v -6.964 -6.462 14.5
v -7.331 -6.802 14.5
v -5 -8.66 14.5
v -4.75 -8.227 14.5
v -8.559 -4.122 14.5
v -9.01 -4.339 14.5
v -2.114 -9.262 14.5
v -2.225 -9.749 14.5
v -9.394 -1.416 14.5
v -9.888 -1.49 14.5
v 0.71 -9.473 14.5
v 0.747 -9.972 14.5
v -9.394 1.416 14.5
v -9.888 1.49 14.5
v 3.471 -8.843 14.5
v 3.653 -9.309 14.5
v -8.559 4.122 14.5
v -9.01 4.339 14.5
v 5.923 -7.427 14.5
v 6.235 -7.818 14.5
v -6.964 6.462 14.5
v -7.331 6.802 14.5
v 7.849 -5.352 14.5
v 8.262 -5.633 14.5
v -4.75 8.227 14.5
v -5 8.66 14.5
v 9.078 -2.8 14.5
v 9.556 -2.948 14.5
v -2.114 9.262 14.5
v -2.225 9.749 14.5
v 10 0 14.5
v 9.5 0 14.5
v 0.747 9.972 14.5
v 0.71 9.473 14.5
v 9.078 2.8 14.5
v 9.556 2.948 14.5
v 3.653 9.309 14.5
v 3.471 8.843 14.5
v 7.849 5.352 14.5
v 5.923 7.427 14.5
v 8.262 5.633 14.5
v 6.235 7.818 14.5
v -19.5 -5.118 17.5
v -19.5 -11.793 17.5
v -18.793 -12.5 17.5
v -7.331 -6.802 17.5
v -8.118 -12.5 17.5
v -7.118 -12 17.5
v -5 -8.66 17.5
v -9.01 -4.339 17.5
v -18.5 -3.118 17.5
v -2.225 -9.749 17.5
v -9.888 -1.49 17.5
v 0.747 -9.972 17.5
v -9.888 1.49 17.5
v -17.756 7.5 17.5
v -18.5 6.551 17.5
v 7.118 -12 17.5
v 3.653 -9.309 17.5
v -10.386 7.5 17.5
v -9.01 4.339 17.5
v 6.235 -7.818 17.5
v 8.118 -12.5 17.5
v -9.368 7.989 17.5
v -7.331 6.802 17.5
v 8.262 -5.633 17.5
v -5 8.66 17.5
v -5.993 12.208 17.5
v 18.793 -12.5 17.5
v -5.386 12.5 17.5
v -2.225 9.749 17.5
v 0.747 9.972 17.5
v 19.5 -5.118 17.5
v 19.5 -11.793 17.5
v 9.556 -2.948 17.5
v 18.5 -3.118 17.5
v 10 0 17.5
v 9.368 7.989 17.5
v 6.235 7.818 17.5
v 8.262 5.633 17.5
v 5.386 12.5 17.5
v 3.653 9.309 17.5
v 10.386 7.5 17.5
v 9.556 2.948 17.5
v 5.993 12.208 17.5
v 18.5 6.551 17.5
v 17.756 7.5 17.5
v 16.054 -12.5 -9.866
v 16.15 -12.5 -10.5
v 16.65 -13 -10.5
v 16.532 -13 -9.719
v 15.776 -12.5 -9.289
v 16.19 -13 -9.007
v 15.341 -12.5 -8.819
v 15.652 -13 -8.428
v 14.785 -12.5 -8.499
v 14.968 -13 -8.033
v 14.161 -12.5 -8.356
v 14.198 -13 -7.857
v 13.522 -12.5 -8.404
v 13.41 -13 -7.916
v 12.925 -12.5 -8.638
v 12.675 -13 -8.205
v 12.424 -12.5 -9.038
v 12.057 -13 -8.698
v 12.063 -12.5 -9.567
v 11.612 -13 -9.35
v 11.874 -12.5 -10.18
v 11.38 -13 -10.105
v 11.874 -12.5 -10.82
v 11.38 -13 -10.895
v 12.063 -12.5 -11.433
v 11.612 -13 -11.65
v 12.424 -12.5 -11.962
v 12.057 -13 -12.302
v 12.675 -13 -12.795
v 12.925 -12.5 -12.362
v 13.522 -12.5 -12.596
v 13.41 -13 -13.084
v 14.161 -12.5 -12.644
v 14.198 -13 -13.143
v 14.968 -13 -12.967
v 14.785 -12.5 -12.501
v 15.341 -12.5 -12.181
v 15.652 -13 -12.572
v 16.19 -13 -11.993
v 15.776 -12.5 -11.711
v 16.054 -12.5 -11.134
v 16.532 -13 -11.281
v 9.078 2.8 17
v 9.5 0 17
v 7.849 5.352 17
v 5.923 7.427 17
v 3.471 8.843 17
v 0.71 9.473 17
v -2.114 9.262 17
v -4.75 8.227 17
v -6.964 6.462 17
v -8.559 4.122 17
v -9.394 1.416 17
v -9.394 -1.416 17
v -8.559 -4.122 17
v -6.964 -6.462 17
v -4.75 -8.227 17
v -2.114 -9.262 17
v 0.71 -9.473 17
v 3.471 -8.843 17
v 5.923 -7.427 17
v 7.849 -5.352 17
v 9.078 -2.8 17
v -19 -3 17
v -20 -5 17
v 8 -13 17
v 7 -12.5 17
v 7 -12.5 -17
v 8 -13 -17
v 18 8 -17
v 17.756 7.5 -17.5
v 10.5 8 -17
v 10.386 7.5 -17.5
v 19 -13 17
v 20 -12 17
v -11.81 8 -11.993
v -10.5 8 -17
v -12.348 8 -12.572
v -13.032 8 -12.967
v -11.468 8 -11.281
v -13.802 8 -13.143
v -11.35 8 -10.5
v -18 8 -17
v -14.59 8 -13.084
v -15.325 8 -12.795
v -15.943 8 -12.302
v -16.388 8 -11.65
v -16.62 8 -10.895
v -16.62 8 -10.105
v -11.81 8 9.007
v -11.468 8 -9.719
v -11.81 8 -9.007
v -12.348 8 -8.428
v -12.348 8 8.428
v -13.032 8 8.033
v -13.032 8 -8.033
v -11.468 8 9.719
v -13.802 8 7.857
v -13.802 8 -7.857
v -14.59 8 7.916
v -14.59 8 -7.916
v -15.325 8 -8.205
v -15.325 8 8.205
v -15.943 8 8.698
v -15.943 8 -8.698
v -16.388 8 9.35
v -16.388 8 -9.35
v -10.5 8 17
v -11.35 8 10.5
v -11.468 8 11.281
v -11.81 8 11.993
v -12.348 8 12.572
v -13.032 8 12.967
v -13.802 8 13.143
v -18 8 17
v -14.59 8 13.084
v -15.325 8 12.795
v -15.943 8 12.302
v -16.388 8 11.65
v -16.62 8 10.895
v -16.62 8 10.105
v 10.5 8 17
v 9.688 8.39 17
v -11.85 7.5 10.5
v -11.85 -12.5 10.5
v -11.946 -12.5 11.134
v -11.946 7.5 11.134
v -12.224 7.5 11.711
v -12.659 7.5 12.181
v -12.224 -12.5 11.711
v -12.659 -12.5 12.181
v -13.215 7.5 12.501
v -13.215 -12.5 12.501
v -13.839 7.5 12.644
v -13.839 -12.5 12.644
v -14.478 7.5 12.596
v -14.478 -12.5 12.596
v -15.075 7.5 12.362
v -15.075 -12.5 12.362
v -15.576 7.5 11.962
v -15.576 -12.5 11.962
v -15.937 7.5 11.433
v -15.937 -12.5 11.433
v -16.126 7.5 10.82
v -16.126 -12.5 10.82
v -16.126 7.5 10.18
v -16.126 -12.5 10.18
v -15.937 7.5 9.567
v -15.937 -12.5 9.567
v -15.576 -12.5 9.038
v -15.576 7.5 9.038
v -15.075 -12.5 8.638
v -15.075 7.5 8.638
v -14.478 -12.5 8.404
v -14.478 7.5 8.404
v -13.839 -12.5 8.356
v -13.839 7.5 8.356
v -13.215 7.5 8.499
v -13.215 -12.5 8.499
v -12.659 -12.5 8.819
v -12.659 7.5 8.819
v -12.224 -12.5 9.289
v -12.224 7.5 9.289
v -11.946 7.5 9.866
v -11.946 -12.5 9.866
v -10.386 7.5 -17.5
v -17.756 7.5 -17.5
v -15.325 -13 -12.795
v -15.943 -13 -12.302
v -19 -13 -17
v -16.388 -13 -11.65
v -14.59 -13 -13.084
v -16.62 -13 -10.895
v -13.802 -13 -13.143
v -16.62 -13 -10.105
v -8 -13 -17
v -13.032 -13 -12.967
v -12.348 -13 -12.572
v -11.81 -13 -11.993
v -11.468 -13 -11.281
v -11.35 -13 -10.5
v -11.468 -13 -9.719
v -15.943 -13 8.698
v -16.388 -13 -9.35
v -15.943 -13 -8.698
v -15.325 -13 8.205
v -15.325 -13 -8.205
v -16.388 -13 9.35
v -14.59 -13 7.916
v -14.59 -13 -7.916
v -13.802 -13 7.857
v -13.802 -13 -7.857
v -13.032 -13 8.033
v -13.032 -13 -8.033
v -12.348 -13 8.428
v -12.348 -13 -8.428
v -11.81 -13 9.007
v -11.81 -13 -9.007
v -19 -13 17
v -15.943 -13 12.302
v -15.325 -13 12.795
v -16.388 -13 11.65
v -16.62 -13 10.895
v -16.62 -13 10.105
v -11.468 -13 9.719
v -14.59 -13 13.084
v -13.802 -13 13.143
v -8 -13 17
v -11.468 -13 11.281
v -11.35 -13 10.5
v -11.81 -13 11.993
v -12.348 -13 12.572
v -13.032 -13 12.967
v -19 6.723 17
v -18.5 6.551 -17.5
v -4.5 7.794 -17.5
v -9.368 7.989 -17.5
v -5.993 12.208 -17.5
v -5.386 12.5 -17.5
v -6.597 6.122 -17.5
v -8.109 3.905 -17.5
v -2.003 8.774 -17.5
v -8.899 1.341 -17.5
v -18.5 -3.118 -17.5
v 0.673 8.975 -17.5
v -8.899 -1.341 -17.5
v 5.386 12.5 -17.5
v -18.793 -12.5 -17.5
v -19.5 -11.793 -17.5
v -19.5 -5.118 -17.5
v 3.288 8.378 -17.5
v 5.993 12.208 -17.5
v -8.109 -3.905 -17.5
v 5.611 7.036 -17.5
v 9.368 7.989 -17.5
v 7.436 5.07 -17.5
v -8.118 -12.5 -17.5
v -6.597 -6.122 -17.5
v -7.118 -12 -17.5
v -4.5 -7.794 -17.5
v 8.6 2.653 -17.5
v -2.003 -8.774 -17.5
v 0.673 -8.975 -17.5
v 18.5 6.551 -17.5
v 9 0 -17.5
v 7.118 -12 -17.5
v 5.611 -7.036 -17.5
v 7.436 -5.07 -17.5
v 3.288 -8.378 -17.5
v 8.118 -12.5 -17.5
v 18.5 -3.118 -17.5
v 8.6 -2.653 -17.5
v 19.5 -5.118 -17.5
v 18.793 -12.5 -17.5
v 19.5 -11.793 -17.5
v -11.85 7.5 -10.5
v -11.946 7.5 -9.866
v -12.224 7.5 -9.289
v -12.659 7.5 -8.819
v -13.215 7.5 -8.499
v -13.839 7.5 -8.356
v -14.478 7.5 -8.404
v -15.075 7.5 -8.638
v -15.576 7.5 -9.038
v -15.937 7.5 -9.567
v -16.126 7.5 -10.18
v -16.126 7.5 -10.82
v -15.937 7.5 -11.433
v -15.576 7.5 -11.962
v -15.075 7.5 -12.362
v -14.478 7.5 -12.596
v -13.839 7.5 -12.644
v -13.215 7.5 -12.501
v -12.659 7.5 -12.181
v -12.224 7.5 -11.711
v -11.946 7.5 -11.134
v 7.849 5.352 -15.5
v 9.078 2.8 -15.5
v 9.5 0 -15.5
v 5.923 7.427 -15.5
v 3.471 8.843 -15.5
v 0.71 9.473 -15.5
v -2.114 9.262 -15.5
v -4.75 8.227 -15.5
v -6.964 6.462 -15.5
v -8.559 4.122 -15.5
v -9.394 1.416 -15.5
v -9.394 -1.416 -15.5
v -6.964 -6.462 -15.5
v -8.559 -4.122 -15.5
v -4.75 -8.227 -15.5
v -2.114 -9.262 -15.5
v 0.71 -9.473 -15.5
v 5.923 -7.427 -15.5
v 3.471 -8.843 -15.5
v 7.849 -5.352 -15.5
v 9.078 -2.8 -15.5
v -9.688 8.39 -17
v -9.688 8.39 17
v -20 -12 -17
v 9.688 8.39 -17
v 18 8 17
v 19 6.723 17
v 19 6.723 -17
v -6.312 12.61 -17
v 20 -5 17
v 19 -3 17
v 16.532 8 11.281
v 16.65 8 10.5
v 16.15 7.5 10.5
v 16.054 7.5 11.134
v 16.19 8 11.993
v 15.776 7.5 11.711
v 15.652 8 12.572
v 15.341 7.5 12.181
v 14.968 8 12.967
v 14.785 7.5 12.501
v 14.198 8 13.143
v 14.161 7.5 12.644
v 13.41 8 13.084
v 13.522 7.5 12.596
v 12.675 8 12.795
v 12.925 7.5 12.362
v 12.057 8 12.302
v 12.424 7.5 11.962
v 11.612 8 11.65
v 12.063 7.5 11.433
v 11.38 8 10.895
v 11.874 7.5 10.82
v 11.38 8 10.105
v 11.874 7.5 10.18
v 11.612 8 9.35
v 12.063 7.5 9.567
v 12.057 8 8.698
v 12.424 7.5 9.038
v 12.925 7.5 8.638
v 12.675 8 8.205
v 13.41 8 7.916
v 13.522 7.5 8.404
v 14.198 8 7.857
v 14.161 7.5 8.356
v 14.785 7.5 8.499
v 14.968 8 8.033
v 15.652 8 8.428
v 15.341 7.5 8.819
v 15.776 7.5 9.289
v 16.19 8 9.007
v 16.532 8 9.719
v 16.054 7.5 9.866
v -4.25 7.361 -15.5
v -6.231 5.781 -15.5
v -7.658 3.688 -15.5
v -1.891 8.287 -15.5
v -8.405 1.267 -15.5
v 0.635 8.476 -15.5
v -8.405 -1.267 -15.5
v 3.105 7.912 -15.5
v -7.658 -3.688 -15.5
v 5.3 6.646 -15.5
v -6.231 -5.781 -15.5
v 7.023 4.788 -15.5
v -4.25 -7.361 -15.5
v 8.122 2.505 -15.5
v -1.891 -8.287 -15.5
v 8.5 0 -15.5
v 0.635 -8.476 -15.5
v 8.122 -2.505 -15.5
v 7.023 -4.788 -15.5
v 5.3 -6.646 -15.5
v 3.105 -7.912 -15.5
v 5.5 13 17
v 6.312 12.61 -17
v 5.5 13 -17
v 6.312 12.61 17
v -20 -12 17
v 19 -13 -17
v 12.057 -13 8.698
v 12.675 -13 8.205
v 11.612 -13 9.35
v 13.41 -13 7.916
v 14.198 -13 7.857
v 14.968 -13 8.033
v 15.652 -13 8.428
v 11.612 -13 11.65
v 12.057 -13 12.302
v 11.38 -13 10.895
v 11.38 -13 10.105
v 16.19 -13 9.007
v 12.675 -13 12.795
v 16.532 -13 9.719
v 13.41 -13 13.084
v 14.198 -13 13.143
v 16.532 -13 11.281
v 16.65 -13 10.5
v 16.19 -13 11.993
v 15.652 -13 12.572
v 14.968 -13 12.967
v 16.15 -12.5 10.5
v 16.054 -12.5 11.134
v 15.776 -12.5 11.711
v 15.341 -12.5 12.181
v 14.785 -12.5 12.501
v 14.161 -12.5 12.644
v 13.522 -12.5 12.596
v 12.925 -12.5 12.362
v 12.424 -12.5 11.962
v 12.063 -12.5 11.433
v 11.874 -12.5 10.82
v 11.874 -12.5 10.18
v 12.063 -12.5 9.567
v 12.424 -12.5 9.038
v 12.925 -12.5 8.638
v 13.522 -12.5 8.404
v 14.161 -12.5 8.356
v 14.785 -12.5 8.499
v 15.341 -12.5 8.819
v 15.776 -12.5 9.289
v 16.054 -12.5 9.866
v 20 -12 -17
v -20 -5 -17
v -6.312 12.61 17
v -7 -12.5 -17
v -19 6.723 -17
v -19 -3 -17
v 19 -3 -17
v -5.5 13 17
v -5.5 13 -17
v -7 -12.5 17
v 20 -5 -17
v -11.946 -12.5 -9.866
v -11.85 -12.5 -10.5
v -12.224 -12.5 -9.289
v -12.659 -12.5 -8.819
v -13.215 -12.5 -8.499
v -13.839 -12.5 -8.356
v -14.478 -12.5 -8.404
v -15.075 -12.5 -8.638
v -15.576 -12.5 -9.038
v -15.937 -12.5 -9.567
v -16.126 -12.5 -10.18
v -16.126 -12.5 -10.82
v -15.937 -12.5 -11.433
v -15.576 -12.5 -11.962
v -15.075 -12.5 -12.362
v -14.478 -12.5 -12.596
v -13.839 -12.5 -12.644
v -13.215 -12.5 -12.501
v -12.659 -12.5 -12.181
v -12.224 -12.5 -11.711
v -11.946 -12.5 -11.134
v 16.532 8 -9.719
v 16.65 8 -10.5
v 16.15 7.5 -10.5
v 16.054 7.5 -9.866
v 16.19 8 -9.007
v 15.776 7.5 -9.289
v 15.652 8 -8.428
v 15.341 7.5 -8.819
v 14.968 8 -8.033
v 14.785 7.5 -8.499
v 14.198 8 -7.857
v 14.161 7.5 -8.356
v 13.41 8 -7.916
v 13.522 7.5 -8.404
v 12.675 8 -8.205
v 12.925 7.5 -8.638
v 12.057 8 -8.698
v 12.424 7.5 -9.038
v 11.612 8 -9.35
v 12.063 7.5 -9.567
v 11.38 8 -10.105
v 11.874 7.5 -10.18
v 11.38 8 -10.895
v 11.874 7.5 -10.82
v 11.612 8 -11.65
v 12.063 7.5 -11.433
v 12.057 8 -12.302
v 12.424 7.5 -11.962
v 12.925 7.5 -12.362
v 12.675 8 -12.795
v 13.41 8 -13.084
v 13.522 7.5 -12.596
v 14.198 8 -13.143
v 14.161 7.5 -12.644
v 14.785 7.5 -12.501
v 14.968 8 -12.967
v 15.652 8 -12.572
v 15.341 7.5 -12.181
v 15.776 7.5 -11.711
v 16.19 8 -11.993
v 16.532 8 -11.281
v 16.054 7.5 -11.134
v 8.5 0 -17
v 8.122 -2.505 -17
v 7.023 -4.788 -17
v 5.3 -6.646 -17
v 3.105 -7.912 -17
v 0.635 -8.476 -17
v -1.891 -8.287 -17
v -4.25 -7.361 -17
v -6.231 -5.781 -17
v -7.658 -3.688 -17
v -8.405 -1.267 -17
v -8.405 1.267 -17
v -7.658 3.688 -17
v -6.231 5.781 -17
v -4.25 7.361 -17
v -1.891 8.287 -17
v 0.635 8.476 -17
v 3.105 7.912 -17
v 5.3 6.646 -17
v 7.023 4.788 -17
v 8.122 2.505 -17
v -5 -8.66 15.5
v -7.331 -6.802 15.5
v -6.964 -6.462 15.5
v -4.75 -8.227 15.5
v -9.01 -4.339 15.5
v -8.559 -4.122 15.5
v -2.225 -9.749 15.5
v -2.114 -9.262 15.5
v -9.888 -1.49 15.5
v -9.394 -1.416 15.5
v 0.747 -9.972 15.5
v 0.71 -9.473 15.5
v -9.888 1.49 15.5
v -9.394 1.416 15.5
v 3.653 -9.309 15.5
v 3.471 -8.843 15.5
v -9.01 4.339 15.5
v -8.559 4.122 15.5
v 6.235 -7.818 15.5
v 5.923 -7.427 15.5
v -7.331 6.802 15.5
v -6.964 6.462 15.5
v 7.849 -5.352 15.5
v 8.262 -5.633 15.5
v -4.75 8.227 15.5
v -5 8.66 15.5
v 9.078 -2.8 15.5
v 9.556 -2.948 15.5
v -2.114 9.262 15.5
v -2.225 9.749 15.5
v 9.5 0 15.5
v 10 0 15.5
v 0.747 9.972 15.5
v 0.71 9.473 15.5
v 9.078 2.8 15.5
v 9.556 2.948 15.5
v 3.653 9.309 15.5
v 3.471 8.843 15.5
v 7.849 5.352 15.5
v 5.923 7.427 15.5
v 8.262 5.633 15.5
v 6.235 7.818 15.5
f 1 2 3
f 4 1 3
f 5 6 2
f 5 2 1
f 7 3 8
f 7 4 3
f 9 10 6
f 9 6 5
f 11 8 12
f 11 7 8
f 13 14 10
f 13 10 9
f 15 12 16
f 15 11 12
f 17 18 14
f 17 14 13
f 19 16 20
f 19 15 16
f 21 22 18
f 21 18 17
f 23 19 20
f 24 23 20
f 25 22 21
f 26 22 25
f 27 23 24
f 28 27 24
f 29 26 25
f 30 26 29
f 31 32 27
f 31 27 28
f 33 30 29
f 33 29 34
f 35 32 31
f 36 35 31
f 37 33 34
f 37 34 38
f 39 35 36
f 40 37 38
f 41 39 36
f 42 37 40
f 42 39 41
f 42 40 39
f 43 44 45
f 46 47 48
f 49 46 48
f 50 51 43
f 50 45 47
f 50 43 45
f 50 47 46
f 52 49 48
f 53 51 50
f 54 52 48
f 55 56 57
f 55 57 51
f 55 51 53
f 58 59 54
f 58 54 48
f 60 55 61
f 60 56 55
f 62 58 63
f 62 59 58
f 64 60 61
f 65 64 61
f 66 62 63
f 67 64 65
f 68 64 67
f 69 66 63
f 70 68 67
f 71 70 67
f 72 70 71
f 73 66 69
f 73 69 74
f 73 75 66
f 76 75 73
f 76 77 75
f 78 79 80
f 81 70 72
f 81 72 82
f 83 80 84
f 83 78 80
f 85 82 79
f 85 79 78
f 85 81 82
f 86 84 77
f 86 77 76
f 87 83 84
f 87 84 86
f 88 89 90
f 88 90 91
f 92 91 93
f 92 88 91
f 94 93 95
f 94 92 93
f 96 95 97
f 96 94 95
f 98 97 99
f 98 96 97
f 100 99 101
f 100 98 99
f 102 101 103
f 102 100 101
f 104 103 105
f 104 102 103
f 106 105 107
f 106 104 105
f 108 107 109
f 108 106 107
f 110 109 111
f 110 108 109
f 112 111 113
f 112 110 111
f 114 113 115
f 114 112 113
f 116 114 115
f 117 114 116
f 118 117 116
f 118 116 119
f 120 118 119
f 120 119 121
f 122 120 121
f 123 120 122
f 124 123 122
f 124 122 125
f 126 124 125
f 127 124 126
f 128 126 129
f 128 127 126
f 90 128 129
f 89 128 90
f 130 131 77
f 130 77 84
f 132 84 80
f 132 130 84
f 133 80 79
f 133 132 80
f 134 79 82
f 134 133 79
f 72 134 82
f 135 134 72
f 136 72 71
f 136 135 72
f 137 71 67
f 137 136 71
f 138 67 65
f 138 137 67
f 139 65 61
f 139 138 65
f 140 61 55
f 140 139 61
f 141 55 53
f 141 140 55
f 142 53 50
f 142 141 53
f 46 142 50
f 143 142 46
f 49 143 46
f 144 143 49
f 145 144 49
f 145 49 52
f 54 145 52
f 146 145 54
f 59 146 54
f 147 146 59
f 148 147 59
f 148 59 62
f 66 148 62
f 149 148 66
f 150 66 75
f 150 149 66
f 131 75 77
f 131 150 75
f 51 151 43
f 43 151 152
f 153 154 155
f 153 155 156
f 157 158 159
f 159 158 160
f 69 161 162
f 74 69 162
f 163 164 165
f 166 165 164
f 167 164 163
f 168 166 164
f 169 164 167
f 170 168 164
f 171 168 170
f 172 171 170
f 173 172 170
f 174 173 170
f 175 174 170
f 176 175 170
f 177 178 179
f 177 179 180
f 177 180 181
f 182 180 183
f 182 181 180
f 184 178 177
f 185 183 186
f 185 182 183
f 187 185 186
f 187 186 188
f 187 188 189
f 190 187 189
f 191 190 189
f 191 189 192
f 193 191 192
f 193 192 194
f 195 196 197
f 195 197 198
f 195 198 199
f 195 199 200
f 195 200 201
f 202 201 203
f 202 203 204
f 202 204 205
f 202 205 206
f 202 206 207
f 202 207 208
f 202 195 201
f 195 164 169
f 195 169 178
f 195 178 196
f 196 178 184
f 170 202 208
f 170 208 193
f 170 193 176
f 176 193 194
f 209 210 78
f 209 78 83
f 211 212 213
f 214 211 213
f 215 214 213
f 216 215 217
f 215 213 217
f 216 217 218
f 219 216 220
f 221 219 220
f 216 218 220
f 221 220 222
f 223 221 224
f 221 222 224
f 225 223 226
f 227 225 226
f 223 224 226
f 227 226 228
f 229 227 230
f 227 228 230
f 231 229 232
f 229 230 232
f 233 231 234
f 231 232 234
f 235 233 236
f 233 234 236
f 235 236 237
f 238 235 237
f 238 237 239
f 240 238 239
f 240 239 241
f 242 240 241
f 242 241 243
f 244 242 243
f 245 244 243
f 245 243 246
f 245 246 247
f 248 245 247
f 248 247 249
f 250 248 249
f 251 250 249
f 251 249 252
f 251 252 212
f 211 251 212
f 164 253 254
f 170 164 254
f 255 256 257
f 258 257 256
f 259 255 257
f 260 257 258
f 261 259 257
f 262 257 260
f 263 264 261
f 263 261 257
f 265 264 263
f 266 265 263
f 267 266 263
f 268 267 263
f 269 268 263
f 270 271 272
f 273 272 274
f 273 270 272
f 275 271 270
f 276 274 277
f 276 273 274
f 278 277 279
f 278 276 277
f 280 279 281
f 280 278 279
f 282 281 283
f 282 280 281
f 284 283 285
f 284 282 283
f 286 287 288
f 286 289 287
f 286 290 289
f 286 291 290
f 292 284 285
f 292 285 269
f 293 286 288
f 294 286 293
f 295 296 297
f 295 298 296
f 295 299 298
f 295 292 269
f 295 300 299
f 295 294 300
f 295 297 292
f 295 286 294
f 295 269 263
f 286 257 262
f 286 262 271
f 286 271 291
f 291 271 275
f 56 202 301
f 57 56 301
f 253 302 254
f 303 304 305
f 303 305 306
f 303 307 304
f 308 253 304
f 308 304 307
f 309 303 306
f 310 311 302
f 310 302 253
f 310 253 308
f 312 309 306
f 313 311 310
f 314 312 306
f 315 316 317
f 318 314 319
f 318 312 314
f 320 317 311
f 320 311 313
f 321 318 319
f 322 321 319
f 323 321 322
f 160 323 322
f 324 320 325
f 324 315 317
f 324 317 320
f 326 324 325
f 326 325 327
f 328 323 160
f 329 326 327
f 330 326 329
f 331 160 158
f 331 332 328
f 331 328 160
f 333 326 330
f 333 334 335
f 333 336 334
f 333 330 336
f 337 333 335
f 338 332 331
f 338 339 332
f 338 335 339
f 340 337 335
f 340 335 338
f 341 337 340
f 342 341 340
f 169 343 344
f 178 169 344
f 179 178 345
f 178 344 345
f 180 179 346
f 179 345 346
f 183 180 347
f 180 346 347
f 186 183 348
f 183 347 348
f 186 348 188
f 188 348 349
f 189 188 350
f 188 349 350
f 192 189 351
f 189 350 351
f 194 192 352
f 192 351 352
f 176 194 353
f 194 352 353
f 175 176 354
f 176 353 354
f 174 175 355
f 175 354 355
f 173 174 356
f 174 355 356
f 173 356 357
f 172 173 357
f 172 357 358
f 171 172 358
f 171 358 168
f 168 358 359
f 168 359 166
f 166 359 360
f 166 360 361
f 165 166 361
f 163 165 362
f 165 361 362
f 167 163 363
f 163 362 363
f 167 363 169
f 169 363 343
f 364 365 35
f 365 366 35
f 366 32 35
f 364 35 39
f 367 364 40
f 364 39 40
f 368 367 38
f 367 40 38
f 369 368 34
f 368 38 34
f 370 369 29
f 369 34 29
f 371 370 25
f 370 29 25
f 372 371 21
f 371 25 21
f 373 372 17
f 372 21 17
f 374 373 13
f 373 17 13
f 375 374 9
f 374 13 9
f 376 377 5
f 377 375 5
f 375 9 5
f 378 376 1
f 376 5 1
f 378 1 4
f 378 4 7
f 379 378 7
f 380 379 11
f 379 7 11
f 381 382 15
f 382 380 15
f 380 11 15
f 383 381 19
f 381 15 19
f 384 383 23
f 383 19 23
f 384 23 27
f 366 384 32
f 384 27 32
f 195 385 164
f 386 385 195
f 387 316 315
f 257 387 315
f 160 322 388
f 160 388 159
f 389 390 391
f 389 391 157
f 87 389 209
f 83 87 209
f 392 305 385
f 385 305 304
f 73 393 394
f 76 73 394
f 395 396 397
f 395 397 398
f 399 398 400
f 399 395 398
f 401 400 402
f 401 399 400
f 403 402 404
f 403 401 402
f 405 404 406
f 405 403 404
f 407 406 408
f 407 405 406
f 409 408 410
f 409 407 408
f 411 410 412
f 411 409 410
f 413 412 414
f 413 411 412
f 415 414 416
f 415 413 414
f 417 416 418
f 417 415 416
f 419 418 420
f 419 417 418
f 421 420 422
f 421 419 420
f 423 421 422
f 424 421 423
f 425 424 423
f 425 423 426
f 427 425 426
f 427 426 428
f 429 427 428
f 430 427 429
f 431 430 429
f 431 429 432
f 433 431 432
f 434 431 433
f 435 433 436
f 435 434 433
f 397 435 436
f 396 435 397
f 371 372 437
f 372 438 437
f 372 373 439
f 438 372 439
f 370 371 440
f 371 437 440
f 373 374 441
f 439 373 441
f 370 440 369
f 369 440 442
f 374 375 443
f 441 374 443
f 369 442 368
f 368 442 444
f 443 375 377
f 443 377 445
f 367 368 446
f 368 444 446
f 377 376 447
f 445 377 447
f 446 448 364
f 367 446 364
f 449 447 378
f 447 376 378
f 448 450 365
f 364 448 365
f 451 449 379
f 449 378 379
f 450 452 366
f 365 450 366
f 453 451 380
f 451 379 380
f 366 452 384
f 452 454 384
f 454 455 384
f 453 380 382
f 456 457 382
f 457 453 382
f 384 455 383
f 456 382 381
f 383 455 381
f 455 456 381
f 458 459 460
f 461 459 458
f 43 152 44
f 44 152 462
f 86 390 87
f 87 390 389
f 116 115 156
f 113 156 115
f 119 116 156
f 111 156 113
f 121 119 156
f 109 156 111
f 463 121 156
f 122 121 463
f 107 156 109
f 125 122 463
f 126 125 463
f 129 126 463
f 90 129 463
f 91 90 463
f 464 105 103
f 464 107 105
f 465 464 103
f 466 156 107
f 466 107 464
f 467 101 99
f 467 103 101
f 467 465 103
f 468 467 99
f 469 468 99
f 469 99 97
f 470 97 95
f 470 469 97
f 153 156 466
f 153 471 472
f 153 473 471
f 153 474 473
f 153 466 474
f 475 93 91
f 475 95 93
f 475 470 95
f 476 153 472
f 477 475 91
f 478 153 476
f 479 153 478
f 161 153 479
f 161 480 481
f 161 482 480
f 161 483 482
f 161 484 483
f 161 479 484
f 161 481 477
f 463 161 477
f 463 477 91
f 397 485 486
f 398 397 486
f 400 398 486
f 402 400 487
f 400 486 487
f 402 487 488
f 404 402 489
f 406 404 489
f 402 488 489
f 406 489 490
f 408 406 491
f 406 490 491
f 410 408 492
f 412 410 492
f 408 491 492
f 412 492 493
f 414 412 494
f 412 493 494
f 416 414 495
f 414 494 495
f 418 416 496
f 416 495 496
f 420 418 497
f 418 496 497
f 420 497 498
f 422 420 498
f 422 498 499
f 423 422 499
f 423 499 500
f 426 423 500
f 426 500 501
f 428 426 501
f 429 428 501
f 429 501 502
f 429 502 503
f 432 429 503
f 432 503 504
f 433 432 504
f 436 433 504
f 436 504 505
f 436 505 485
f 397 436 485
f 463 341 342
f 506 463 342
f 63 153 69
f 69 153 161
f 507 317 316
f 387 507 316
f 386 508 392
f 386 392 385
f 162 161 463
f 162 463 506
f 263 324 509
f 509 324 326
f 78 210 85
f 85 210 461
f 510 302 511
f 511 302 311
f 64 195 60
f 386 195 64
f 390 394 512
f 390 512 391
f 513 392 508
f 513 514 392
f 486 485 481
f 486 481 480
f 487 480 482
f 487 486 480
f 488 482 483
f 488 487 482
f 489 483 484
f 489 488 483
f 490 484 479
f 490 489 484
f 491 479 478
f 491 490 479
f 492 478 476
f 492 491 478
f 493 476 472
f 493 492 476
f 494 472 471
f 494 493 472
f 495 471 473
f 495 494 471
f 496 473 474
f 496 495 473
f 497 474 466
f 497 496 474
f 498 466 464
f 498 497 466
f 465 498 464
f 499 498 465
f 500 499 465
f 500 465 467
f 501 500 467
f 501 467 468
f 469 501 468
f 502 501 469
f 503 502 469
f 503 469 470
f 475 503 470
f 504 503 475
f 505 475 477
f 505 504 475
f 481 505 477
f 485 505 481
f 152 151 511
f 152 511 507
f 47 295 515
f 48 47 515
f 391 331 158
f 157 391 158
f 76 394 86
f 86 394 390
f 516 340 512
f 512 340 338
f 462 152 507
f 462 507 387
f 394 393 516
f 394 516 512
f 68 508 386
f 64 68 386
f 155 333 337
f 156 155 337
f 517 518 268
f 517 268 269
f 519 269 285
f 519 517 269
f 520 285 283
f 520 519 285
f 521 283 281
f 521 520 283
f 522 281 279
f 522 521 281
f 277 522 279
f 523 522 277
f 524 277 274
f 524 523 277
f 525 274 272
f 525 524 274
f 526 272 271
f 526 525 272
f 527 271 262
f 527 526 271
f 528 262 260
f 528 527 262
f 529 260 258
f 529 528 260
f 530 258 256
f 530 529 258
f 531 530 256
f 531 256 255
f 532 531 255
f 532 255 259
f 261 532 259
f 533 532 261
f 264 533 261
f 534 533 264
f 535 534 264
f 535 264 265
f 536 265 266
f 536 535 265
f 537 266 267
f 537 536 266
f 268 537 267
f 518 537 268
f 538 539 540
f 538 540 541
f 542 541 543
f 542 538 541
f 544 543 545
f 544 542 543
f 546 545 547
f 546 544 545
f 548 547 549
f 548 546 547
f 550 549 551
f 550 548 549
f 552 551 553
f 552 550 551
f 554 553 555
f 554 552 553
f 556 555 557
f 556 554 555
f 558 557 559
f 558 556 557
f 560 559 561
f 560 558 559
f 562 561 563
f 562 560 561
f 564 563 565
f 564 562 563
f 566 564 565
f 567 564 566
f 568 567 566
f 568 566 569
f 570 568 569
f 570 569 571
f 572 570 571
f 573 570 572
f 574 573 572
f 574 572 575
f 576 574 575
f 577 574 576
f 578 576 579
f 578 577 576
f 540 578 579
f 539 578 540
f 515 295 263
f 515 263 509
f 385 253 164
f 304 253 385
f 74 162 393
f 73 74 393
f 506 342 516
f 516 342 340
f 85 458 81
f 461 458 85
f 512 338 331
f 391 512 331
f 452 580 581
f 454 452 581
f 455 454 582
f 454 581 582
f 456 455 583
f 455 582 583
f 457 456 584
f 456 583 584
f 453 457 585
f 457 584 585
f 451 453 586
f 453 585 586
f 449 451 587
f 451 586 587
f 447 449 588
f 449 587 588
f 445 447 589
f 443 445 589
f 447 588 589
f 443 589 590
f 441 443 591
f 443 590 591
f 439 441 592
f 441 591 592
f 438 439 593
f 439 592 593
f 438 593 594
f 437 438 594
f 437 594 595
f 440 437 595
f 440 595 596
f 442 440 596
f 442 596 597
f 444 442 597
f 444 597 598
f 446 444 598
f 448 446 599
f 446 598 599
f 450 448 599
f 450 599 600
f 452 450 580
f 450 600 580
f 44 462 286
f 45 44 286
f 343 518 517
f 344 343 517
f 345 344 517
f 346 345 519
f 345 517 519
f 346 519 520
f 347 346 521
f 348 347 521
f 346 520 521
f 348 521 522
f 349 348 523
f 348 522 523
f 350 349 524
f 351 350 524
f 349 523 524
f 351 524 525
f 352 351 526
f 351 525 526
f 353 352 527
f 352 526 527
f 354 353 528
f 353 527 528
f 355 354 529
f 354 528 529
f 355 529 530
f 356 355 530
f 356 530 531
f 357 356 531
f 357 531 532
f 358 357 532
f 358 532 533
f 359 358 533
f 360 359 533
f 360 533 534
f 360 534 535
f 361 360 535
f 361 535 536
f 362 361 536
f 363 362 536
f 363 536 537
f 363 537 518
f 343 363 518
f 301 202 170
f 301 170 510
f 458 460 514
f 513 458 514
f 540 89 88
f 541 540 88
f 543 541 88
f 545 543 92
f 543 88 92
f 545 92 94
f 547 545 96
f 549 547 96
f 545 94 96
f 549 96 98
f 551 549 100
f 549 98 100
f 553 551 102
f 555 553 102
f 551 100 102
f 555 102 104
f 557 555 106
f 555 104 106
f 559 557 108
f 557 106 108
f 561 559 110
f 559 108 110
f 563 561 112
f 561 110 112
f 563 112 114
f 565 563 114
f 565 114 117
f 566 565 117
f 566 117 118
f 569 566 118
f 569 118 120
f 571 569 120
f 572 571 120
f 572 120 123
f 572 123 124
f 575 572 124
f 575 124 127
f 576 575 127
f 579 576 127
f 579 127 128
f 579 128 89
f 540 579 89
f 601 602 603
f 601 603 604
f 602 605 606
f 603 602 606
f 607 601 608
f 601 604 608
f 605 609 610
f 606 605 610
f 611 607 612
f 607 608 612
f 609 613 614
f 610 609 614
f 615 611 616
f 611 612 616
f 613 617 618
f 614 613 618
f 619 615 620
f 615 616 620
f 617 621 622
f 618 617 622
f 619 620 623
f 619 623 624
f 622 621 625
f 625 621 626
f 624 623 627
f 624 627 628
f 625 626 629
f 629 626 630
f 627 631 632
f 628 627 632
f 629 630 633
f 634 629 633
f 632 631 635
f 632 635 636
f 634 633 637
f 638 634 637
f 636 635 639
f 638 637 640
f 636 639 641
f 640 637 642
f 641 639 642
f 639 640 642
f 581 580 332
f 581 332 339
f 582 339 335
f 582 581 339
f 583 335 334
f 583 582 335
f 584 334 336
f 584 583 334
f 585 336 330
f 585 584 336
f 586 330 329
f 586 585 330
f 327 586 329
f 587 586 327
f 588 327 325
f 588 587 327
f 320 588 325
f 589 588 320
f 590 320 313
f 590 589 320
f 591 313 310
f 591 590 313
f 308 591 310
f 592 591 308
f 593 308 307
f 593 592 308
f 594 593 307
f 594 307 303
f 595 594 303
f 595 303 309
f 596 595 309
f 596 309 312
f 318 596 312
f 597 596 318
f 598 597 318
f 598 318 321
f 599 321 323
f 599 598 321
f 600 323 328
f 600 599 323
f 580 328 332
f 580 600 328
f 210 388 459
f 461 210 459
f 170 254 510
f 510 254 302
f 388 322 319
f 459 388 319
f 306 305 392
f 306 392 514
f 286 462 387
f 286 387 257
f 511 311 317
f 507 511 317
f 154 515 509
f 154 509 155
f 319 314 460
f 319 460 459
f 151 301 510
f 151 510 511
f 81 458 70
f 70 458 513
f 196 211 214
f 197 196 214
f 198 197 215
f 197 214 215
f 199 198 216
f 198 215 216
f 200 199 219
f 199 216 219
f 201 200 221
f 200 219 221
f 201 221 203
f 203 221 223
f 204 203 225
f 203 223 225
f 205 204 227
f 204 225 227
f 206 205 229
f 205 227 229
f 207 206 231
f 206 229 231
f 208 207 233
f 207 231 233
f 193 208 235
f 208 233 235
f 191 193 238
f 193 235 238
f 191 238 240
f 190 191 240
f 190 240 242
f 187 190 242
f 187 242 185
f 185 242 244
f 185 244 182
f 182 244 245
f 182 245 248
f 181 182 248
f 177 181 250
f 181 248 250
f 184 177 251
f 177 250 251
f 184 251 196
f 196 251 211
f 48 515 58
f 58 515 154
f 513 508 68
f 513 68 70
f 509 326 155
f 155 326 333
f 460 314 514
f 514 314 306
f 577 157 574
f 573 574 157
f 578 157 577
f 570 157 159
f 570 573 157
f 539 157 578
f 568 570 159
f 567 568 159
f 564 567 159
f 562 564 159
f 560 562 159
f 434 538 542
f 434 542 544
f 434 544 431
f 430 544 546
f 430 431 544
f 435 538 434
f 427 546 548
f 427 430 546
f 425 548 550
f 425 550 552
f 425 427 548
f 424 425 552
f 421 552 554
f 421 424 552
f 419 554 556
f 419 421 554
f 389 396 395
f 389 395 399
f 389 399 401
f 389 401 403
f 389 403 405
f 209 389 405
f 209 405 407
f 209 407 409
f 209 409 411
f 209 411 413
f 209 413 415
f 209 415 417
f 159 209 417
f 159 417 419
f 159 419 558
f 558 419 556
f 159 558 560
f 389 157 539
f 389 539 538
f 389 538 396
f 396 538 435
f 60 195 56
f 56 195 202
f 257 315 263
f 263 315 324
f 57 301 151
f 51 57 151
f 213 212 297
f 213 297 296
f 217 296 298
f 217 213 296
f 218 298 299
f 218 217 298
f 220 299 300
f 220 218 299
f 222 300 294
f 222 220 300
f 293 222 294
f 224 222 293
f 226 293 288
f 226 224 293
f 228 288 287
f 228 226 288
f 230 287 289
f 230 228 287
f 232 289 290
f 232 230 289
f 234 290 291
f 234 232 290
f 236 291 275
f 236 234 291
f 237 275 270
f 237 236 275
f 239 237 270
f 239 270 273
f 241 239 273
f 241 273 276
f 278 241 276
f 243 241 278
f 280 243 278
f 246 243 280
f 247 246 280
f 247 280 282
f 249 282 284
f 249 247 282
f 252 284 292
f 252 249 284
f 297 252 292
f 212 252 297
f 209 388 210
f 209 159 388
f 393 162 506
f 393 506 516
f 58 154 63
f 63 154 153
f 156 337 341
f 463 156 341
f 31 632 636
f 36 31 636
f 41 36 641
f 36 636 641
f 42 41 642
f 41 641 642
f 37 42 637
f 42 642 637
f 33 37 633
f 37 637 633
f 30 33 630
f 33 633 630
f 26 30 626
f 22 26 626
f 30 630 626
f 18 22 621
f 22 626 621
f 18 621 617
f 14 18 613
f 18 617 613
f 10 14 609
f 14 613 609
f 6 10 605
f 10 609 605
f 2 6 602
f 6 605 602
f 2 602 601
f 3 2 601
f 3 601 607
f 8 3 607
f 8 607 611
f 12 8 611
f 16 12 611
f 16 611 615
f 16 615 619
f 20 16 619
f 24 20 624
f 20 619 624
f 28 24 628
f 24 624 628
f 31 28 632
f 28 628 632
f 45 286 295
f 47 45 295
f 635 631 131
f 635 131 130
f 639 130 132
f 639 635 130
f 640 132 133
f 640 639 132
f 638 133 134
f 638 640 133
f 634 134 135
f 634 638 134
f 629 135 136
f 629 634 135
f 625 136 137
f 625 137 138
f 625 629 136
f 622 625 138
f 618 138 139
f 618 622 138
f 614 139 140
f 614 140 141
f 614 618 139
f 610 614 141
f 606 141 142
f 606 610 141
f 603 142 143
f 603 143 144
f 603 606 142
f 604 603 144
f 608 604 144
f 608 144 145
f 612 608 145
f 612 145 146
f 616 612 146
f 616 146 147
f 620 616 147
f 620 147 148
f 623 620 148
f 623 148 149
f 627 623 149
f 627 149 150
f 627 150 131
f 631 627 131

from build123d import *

# Parameters (mm, degrees)
F0_R          = 9.5
F1_DEPTH      = 17.5
F1_DEPTH_BACK = 17.5
F2_R          = 2.15
F3_DEPTH      = 25
F4_SIZE       = 0.5
F5_R          = 9.5
F5_R_2        = 8.5
F6_DEPTH      = 2
F8_R          = 10
F9_DEPTH      = 1
F10_SIZE      = 0.5
F11_SIZE      = 0.5
F12_SIZE      = 0.5


with BuildPart() as f1:
    # F0 (on Top) → F1 (new body, two sides)
    with BuildSketch(Plane.XY) as f1_sk:
        Polygon((8, -13), (19, -13), (20, -12), (20, -5), (19, -3), (19, 6.723037264), (18, 8), (10, 8), (6, 13), (-6, 13), (-10, 8), (-18, 8), (-19, 6.723037264), (-19, -3), (-20, -5), (-20, -12), (-19, -13), (-8, -13), (-7, -12.5), (7, -12.5), align=None)
        Circle(F0_R, mode=Mode.SUBTRACT)
    extrude(amount=F1_DEPTH)
    extrude(f1_sk.sketch, amount=-F1_DEPTH_BACK)

    # F2 (on face) → F3 (cut)
    with BuildSketch(Plane.XZ.offset(13)):
        with Locations((-14, 10.5)):
            Circle(F2_R)
        with Locations((14, 10.5)):
            Circle(F2_R)
        with Locations((14, -10.5)):
            Circle(F2_R)
        with Locations((-14, -10.5)):
            Circle(F2_R)
    extrude(amount=-F3_DEPTH, mode=Mode.SUBTRACT)

    # F4
    f4_edges = [f1.edges().sort_by_distance(p)[0] for p in [
        (-16.15, 8, 10.5),
        (-16.15, 8, -10.5),
        (11.85, 8, -10.5),
        (11.85, 8, 10.5),
        (-16.15, -13, 10.5),
        (-16.15, -13, -10.5),
        (11.85, -13, -10.5),
        (11.85, -13, 10.5),
    ]]
    chamfer(f4_edges, length=F4_SIZE)

    # F5 (on face) → F6 (join)
    with BuildSketch(Plane(origin=(0, 0, -17.5), x_dir=(1, 0, 0), z_dir=(0, 0, -1))):
        Circle(F5_R)
        Circle(F5_R_2, mode=Mode.SUBTRACT)
    extrude(amount=-F6_DEPTH)

    # F8 (on offset) → F9 (cut)
    with BuildSketch(Plane.XY.offset(15.5)):
        Circle(F8_R)
    extrude(amount=-F9_DEPTH, mode=Mode.SUBTRACT)

    # F10
    f10_edges = [f1.edges().sort_by_distance(p)[0] for p in [
        (-10, 8, 0),
        (-6, 13, 0),
        (6, 13, 0),
        (10, 8, 0),
    ]]
    chamfer(f10_edges, length=F10_SIZE)

    # F11
    f11_edges = [f1.edges().sort_by_distance(p)[0] for p in [
        (14.25, 8, 17.5),
        (10.093826, 8.195217, 17.5),
        (18.5, 7.361519, 17.5),
        (8, 10.5, 17.5),
        (19, 1.861519, 17.5),
        (5.906174, 12.804783, 17.5),
        (19.5, -4, 17.5),
        (0, 13, 17.5),
        (20, -8.5, 17.5),
        (-5.906174, 12.804783, 17.5),
        (19.5, -12.5, 17.5),
        (-8, 10.5, 17.5),
        (13.5, -13, 17.5),
        (-10.093826, 8.195217, 17.5),
        (7.5, -12.75, 17.5),
        (-14.25, 8, 17.5),
        (0, -12.5, 17.5),
        (-18.5, 7.361519, 17.5),
        (-7.5, -12.75, 17.5),
        (-19, 1.861519, 17.5),
        (-13.5, -13, 17.5),
        (-19.5, -4, 17.5),
        (-19.5, -12.5, 17.5),
        (-20, -8.5, 17.5),
        (-9.5, 0, 17.5),
    ]]
    chamfer(f11_edges, length=F11_SIZE)

    # F12
    f12_edges = [f1.edges().sort_by_distance(p)[0] for p in [
        (14.25, 8, -17.5),
        (10.093826, 8.195217, -17.5),
        (18.5, 7.361519, -17.5),
        (8, 10.5, -17.5),
        (19, 1.861519, -17.5),
        (5.906174, 12.804783, -17.5),
        (19.5, -4, -17.5),
        (0, 13, -17.5),
        (20, -8.5, -17.5),
        (-5.906174, 12.804783, -17.5),
        (19.5, -12.5, -17.5),
        (-8, 10.5, -17.5),
        (13.5, -13, -17.5),
        (-10.093826, 8.195217, -17.5),
        (7.5, -12.75, -17.5),
        (-14.25, 8, -17.5),
        (0, -12.5, -17.5),
        (-18.5, 7.361519, -17.5),
        (-7.5, -12.75, -17.5),
        (-19, 1.861519, -17.5),
        (-13.5, -13, -17.5),
        (-19.5, -4, -17.5),
        (-19.5, -12.5, -17.5),
        (-20, -8.5, -17.5),
        (-8.5, 0, -17.5),
    ]]
    chamfer(f12_edges, length=F12_SIZE)


solid = f1.part
